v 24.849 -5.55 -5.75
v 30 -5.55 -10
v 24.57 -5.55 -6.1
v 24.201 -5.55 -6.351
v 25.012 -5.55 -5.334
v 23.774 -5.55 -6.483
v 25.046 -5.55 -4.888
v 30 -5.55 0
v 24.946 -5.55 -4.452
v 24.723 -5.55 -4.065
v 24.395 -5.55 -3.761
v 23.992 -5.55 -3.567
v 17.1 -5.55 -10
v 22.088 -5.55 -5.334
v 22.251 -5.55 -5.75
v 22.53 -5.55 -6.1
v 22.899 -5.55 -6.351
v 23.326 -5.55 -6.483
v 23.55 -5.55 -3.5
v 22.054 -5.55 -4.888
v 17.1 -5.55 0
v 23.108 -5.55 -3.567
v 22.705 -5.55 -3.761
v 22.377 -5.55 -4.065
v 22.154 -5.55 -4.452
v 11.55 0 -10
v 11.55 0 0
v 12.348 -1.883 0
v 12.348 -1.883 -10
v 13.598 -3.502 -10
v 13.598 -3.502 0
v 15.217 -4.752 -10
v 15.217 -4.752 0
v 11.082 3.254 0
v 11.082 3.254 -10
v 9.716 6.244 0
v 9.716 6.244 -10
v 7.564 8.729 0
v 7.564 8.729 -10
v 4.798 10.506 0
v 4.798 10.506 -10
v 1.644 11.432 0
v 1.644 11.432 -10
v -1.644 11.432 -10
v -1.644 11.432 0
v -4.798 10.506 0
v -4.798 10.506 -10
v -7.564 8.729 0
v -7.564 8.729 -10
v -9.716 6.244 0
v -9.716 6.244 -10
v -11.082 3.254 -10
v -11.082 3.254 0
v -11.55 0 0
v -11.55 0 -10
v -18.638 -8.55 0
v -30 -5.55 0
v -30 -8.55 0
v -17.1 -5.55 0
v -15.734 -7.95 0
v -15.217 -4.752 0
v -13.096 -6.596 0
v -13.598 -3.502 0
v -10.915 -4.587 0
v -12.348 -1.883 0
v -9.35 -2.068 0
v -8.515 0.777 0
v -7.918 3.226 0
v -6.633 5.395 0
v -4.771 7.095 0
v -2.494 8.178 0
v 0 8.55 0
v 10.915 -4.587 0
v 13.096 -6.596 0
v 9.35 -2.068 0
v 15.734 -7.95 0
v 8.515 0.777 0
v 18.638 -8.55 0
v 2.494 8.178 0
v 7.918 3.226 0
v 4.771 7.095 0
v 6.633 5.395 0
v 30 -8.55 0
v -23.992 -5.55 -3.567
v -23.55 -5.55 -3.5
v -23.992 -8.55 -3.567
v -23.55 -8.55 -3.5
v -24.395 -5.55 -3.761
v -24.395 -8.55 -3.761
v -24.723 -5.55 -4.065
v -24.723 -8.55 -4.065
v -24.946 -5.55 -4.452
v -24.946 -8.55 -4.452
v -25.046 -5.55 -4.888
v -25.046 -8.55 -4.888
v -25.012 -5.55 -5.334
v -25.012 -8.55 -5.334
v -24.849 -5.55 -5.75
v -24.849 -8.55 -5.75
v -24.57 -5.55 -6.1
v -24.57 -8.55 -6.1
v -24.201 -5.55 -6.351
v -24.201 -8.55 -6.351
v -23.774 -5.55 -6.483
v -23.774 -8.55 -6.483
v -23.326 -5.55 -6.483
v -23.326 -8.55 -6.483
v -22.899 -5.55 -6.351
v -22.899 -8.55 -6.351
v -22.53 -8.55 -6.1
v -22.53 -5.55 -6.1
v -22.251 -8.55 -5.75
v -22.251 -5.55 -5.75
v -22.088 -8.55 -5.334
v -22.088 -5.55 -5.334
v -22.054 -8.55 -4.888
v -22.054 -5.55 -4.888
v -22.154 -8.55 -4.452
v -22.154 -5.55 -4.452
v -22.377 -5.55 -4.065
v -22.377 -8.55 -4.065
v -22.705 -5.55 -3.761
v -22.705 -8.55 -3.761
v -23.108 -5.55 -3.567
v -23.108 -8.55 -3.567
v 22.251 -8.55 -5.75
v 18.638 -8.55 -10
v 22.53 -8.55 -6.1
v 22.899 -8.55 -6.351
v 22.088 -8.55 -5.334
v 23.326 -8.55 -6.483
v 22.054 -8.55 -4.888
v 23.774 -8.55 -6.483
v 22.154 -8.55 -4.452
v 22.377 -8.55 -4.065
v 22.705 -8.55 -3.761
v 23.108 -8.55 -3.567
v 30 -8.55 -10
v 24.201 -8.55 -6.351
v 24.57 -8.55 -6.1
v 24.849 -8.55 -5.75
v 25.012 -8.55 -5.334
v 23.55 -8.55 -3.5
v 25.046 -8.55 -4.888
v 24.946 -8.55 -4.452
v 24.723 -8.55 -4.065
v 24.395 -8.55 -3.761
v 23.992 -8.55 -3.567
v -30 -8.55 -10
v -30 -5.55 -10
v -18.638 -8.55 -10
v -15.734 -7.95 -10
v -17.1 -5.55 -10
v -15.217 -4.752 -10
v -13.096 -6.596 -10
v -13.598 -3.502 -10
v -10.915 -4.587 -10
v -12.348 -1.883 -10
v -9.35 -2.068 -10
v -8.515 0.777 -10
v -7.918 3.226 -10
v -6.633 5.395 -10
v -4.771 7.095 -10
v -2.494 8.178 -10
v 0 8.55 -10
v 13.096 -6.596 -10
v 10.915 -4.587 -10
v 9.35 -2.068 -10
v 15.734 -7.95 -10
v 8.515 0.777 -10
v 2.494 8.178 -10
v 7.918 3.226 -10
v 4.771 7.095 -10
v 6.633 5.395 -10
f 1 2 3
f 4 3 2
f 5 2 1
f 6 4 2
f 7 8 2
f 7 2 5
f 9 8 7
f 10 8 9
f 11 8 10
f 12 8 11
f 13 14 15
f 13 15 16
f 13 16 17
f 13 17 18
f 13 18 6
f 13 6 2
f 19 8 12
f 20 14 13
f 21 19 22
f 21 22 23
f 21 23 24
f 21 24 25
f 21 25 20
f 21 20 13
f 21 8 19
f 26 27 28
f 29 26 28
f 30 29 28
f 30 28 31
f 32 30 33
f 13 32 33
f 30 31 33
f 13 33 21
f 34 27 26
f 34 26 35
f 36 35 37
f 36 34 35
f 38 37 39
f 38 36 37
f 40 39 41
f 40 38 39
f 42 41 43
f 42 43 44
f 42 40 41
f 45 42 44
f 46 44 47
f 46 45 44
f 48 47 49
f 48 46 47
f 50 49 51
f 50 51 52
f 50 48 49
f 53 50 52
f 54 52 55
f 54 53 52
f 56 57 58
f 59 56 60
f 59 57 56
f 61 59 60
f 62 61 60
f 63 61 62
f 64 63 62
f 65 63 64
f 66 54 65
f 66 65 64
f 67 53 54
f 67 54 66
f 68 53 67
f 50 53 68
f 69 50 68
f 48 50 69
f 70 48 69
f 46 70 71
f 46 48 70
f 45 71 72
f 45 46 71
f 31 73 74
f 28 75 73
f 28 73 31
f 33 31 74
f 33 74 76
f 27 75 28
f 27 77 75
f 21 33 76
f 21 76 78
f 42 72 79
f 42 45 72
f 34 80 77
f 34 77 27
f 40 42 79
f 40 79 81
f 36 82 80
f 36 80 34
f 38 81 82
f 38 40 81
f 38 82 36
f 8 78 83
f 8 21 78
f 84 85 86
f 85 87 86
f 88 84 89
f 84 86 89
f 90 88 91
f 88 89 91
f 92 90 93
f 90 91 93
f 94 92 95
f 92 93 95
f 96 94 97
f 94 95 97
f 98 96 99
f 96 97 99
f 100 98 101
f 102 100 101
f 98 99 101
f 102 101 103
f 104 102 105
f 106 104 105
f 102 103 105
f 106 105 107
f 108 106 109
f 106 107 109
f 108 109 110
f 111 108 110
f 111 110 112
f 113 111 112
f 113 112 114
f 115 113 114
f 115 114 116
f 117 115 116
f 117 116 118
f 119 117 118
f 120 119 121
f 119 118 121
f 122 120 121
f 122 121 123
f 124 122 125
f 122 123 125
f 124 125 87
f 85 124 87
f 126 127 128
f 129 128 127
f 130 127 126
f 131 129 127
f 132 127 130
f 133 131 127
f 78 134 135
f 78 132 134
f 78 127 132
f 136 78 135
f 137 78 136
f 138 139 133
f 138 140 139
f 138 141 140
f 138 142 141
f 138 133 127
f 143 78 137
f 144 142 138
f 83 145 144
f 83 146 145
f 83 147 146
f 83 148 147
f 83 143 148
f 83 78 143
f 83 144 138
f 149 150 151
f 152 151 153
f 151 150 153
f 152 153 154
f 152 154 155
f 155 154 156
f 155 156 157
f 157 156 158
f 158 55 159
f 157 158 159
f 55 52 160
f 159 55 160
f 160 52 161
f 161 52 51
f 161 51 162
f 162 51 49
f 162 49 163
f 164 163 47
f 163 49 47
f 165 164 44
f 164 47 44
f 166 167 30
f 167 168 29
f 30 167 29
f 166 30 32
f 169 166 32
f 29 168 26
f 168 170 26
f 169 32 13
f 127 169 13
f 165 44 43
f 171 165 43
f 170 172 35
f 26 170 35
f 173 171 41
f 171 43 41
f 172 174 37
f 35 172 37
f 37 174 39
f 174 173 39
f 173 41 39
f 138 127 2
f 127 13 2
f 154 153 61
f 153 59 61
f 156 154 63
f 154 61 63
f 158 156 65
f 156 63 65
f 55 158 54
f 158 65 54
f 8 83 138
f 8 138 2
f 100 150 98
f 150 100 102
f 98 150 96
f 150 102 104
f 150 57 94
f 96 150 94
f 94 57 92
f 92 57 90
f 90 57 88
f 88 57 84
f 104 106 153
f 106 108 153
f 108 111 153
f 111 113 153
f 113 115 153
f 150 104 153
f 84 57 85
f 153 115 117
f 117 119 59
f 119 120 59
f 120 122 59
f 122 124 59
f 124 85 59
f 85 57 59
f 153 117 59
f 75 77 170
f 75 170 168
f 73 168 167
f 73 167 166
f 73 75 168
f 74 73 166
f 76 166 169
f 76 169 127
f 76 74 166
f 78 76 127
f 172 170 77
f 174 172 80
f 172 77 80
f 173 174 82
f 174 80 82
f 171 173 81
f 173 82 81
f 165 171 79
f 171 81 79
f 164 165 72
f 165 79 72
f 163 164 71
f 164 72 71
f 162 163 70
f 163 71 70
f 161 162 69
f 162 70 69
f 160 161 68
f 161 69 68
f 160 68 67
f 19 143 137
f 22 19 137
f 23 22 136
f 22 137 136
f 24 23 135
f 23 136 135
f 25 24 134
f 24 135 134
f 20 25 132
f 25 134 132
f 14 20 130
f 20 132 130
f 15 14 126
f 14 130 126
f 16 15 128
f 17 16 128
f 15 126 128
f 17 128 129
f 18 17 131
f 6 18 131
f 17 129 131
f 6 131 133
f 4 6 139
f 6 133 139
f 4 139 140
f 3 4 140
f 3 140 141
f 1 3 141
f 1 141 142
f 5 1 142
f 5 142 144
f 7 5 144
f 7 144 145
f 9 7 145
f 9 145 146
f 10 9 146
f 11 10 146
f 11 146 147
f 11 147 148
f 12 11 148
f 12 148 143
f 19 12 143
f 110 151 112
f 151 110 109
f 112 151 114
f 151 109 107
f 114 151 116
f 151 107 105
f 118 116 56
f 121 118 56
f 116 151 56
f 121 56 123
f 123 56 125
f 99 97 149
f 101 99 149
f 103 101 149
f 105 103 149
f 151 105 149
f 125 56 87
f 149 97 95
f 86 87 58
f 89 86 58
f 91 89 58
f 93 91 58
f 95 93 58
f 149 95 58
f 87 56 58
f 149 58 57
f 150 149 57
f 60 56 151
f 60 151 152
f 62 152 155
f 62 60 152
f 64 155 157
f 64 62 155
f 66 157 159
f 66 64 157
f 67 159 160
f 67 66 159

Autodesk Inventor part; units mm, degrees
ref_plane "YZ Plane" through (0, 0, 0) normal (1, 0, 0) x (0, 1, 0)
ref_plane "XZ Plane" through (0, 0, 0) normal (0, 1, 0) x (-1, 0, 0)
ref_plane "XY Plane" through (0, 0, 0) normal (0, 0, 1) x (1, 0, 0)
sketch "Sketch1" plane through (0, 0, 0) normal (0, 0, 1) x (1, 0, 0)
  arc A0 (8.5146, 0.7768) -> (-8.5146, 0.7768) centre (0, 0) ccw
  line L0 (-18.6378, -8.55) -> (-30, -8.55)
  line L1 (30, -8.55) -> (30, -5.55)
  line L2 (30, -5.55) -> (17.1, -5.55)
  line L3 (-30, -8.55) -> (-30, -5.55)
  line L4 (-30, -5.55) -> (-17.1, -5.55)
  arc A1 (11.55, 0) -> (17.1, -5.55) centre (19.2544, 2.1544) ccw
  line L5 (11.55, 0) -> (17.1, -5.55) construction
  line L6 (11.55, 0) -> (19.3989, 0) construction
  arc A2 (8.4438, 1.3433) -> (18.6378, -8.55) centre (19.3906, 2.4242) ccw
  arc A3 (-17.1, -5.55) -> (-11.55, 0) centre (-19.2544, 2.1544) ccw
  arc A4 (-18.6378, -8.55) -> (-8.4438, 1.3433) centre (-19.3906, 2.4242) ccw
  line L7 (18.6378, -8.55) -> (30, -8.55)
  arc A5 (11.55, 0) -> (-11.55, 0) centre (0, 0) ccw
  dimension "d0" = 17.1
  dimension "d3" = 3
  dimension "d6" = 45
  dimension "d7" = 8
  dimension "d8" = 11
extrude "Extrusion1" add sketch "Sketch1" against normal blind 10 contours A0 A4 L0 L3 L4 A3 A5 A1 L2 L1 L7 A2
sketch "Sketch2" plane through (17.1, -5.55, 0) normal (0, 1, 0) x (1, 0, 0)
  circle A0 centre (6.45, 5) radius 1.5
  point P0 (-17.1, 0)
  dimension "d11" = 3
hole "Hole1" at (23.55, -5.55, -5) direction (0, -1, 0) diameter 3 end through all
sketch "Sketch3" plane through (-30, -5.55, 0) normal (0, 1, 0) x (1, 0, 0)
  circle A0 centre (6.45, 5) radius 1.5
  point P0 (30, 0)
  dimension "d19" = 3
hole "Hole2" at (-23.55, -5.55, -5) direction (0, -1, 0) diameter 3 end through all
sketch "Sketch4" plane through (-30, -8.55, 0) normal (0, -1, 0) x (1, 0, 0)
  circle A0 centre (6.45, -5) radius 1.5 projected
  line L0 (0, -10) -> (11.3622, -10) projected
  line L1 (11.3622, 0) -> (11.3622, -10) projected
  line L2 (0, 0) -> (11.3622, 0) projected
  line L3 (0, 0) -> (0, -10) projected
  point P0 (30, 0)
properties part number "braket motor kipas"
